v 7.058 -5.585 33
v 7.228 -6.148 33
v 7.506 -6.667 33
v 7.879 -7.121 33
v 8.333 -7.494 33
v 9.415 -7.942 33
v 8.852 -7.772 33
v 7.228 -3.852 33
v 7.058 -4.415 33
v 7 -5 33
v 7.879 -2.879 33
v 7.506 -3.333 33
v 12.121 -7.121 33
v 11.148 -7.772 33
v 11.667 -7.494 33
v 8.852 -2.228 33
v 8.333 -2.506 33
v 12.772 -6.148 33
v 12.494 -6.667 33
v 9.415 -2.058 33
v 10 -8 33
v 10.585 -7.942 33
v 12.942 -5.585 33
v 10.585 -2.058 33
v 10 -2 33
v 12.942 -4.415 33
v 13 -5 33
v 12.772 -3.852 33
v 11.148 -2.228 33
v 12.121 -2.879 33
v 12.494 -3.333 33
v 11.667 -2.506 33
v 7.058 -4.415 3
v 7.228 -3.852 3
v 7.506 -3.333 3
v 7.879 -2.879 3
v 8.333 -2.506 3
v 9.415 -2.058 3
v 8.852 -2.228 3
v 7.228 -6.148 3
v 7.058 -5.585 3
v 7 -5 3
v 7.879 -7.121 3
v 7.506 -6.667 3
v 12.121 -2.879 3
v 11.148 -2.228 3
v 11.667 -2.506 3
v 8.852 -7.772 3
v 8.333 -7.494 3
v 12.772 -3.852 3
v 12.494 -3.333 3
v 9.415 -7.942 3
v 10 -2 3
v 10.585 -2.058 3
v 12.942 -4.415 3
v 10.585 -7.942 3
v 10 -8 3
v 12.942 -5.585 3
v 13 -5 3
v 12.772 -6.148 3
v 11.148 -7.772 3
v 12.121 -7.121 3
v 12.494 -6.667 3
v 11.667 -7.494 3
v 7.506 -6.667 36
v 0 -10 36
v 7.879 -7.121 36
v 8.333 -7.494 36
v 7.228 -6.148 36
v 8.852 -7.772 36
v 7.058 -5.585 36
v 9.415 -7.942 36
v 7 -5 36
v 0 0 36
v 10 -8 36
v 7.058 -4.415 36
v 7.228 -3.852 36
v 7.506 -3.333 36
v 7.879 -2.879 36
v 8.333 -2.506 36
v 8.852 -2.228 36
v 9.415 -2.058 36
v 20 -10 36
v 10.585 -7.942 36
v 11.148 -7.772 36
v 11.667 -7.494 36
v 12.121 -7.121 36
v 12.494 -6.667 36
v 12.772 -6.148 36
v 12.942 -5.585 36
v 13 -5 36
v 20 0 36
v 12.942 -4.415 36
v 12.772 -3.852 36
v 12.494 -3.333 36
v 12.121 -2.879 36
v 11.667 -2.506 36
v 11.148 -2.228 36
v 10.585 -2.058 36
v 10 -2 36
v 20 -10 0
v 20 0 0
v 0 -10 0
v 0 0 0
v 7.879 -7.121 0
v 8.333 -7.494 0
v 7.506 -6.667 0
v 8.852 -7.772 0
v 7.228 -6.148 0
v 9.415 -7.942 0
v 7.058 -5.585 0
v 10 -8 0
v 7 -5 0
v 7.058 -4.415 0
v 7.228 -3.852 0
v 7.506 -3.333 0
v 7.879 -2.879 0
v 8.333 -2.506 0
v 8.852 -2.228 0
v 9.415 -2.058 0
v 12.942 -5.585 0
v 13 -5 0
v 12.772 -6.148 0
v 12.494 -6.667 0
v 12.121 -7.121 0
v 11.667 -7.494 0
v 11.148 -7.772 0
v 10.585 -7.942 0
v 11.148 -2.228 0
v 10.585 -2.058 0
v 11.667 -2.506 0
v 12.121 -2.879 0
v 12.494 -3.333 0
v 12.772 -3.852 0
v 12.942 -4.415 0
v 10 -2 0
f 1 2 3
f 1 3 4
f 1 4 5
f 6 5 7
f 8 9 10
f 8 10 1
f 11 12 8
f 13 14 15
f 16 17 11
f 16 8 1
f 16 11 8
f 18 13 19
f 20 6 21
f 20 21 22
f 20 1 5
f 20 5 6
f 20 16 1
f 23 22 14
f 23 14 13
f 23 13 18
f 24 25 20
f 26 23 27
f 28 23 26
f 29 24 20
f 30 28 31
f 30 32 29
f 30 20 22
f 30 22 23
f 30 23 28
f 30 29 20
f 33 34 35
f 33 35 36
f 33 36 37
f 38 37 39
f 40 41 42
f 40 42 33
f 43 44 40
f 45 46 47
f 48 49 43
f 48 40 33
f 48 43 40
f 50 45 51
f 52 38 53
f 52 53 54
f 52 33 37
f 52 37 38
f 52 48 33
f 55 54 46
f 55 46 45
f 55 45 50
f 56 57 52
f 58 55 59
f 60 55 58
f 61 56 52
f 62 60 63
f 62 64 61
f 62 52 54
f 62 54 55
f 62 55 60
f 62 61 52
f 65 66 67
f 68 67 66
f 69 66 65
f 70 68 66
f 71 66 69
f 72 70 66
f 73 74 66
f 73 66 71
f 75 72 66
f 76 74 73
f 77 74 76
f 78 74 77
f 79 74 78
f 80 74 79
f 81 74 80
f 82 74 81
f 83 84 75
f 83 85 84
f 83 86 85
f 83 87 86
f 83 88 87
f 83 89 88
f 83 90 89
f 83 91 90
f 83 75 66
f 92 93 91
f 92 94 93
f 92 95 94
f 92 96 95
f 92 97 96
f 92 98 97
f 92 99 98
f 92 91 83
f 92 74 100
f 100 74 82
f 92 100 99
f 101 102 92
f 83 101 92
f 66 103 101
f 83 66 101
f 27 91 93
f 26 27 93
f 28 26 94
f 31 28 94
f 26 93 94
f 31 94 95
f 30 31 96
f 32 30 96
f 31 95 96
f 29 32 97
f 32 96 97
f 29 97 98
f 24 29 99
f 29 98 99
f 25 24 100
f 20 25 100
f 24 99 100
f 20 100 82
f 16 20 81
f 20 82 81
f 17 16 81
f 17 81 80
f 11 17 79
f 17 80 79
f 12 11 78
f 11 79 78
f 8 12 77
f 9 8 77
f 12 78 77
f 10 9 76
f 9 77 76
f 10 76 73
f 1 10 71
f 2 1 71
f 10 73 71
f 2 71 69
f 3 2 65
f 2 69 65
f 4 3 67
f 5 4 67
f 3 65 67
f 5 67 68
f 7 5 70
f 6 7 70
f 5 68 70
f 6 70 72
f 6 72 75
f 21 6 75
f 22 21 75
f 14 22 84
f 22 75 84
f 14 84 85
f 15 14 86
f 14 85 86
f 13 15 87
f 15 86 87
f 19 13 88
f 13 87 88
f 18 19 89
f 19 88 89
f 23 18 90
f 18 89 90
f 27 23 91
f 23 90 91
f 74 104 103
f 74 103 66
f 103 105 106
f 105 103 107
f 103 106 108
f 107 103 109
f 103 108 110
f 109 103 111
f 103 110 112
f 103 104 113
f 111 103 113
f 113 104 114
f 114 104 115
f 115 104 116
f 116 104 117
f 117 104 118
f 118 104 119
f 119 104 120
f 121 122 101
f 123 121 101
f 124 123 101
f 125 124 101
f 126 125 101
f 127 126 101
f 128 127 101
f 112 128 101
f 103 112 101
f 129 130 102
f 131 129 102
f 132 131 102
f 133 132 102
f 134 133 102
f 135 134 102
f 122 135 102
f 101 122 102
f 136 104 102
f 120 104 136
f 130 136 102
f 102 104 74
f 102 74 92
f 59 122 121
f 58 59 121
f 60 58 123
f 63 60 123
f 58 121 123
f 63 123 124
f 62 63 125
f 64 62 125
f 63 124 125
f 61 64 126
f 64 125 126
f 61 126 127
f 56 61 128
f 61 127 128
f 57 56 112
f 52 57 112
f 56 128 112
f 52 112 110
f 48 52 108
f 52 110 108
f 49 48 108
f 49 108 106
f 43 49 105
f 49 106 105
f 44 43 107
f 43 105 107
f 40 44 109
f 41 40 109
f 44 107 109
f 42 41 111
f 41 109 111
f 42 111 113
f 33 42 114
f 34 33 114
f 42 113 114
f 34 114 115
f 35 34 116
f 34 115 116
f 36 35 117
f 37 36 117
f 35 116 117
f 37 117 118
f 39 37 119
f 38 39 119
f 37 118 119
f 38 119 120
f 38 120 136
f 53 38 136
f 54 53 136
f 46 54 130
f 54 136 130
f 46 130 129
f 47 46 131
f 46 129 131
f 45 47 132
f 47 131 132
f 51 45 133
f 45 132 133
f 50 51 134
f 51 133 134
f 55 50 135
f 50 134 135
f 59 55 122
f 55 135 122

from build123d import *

# Parameters (mm, degrees)
F0_W     = 20
F0_H     = 36
F1_DEPTH = 10
F2_R     = 3
F3_DEPTH = 3
F4_R     = 3
F5_DEPTH = 3


with BuildPart() as f1:
    # F0 (on Front) → F1 (new body)
    with BuildSketch(Plane.XZ):
        with Locations((10, 18)):
            Rectangle(F0_W, F0_H)
    extrude(amount=F1_DEPTH)

    # F2 (on face) → F3 (cut)
    with BuildSketch(Plane(origin=(0, 0, 0), x_dir=(1, 0, 0), z_dir=(0, 0, -1))):
        with Locations((10, 5)):
            Circle(F2_R)
    extrude(amount=-F3_DEPTH, mode=Mode.SUBTRACT)

    # F4 (on face) → F5 (cut)
    with BuildSketch(Plane.XY.offset(36)):
        with Locations((10, -5)):
            Circle(F4_R)
    extrude(amount=-F5_DEPTH, mode=Mode.SUBTRACT)


solid = f1.part
